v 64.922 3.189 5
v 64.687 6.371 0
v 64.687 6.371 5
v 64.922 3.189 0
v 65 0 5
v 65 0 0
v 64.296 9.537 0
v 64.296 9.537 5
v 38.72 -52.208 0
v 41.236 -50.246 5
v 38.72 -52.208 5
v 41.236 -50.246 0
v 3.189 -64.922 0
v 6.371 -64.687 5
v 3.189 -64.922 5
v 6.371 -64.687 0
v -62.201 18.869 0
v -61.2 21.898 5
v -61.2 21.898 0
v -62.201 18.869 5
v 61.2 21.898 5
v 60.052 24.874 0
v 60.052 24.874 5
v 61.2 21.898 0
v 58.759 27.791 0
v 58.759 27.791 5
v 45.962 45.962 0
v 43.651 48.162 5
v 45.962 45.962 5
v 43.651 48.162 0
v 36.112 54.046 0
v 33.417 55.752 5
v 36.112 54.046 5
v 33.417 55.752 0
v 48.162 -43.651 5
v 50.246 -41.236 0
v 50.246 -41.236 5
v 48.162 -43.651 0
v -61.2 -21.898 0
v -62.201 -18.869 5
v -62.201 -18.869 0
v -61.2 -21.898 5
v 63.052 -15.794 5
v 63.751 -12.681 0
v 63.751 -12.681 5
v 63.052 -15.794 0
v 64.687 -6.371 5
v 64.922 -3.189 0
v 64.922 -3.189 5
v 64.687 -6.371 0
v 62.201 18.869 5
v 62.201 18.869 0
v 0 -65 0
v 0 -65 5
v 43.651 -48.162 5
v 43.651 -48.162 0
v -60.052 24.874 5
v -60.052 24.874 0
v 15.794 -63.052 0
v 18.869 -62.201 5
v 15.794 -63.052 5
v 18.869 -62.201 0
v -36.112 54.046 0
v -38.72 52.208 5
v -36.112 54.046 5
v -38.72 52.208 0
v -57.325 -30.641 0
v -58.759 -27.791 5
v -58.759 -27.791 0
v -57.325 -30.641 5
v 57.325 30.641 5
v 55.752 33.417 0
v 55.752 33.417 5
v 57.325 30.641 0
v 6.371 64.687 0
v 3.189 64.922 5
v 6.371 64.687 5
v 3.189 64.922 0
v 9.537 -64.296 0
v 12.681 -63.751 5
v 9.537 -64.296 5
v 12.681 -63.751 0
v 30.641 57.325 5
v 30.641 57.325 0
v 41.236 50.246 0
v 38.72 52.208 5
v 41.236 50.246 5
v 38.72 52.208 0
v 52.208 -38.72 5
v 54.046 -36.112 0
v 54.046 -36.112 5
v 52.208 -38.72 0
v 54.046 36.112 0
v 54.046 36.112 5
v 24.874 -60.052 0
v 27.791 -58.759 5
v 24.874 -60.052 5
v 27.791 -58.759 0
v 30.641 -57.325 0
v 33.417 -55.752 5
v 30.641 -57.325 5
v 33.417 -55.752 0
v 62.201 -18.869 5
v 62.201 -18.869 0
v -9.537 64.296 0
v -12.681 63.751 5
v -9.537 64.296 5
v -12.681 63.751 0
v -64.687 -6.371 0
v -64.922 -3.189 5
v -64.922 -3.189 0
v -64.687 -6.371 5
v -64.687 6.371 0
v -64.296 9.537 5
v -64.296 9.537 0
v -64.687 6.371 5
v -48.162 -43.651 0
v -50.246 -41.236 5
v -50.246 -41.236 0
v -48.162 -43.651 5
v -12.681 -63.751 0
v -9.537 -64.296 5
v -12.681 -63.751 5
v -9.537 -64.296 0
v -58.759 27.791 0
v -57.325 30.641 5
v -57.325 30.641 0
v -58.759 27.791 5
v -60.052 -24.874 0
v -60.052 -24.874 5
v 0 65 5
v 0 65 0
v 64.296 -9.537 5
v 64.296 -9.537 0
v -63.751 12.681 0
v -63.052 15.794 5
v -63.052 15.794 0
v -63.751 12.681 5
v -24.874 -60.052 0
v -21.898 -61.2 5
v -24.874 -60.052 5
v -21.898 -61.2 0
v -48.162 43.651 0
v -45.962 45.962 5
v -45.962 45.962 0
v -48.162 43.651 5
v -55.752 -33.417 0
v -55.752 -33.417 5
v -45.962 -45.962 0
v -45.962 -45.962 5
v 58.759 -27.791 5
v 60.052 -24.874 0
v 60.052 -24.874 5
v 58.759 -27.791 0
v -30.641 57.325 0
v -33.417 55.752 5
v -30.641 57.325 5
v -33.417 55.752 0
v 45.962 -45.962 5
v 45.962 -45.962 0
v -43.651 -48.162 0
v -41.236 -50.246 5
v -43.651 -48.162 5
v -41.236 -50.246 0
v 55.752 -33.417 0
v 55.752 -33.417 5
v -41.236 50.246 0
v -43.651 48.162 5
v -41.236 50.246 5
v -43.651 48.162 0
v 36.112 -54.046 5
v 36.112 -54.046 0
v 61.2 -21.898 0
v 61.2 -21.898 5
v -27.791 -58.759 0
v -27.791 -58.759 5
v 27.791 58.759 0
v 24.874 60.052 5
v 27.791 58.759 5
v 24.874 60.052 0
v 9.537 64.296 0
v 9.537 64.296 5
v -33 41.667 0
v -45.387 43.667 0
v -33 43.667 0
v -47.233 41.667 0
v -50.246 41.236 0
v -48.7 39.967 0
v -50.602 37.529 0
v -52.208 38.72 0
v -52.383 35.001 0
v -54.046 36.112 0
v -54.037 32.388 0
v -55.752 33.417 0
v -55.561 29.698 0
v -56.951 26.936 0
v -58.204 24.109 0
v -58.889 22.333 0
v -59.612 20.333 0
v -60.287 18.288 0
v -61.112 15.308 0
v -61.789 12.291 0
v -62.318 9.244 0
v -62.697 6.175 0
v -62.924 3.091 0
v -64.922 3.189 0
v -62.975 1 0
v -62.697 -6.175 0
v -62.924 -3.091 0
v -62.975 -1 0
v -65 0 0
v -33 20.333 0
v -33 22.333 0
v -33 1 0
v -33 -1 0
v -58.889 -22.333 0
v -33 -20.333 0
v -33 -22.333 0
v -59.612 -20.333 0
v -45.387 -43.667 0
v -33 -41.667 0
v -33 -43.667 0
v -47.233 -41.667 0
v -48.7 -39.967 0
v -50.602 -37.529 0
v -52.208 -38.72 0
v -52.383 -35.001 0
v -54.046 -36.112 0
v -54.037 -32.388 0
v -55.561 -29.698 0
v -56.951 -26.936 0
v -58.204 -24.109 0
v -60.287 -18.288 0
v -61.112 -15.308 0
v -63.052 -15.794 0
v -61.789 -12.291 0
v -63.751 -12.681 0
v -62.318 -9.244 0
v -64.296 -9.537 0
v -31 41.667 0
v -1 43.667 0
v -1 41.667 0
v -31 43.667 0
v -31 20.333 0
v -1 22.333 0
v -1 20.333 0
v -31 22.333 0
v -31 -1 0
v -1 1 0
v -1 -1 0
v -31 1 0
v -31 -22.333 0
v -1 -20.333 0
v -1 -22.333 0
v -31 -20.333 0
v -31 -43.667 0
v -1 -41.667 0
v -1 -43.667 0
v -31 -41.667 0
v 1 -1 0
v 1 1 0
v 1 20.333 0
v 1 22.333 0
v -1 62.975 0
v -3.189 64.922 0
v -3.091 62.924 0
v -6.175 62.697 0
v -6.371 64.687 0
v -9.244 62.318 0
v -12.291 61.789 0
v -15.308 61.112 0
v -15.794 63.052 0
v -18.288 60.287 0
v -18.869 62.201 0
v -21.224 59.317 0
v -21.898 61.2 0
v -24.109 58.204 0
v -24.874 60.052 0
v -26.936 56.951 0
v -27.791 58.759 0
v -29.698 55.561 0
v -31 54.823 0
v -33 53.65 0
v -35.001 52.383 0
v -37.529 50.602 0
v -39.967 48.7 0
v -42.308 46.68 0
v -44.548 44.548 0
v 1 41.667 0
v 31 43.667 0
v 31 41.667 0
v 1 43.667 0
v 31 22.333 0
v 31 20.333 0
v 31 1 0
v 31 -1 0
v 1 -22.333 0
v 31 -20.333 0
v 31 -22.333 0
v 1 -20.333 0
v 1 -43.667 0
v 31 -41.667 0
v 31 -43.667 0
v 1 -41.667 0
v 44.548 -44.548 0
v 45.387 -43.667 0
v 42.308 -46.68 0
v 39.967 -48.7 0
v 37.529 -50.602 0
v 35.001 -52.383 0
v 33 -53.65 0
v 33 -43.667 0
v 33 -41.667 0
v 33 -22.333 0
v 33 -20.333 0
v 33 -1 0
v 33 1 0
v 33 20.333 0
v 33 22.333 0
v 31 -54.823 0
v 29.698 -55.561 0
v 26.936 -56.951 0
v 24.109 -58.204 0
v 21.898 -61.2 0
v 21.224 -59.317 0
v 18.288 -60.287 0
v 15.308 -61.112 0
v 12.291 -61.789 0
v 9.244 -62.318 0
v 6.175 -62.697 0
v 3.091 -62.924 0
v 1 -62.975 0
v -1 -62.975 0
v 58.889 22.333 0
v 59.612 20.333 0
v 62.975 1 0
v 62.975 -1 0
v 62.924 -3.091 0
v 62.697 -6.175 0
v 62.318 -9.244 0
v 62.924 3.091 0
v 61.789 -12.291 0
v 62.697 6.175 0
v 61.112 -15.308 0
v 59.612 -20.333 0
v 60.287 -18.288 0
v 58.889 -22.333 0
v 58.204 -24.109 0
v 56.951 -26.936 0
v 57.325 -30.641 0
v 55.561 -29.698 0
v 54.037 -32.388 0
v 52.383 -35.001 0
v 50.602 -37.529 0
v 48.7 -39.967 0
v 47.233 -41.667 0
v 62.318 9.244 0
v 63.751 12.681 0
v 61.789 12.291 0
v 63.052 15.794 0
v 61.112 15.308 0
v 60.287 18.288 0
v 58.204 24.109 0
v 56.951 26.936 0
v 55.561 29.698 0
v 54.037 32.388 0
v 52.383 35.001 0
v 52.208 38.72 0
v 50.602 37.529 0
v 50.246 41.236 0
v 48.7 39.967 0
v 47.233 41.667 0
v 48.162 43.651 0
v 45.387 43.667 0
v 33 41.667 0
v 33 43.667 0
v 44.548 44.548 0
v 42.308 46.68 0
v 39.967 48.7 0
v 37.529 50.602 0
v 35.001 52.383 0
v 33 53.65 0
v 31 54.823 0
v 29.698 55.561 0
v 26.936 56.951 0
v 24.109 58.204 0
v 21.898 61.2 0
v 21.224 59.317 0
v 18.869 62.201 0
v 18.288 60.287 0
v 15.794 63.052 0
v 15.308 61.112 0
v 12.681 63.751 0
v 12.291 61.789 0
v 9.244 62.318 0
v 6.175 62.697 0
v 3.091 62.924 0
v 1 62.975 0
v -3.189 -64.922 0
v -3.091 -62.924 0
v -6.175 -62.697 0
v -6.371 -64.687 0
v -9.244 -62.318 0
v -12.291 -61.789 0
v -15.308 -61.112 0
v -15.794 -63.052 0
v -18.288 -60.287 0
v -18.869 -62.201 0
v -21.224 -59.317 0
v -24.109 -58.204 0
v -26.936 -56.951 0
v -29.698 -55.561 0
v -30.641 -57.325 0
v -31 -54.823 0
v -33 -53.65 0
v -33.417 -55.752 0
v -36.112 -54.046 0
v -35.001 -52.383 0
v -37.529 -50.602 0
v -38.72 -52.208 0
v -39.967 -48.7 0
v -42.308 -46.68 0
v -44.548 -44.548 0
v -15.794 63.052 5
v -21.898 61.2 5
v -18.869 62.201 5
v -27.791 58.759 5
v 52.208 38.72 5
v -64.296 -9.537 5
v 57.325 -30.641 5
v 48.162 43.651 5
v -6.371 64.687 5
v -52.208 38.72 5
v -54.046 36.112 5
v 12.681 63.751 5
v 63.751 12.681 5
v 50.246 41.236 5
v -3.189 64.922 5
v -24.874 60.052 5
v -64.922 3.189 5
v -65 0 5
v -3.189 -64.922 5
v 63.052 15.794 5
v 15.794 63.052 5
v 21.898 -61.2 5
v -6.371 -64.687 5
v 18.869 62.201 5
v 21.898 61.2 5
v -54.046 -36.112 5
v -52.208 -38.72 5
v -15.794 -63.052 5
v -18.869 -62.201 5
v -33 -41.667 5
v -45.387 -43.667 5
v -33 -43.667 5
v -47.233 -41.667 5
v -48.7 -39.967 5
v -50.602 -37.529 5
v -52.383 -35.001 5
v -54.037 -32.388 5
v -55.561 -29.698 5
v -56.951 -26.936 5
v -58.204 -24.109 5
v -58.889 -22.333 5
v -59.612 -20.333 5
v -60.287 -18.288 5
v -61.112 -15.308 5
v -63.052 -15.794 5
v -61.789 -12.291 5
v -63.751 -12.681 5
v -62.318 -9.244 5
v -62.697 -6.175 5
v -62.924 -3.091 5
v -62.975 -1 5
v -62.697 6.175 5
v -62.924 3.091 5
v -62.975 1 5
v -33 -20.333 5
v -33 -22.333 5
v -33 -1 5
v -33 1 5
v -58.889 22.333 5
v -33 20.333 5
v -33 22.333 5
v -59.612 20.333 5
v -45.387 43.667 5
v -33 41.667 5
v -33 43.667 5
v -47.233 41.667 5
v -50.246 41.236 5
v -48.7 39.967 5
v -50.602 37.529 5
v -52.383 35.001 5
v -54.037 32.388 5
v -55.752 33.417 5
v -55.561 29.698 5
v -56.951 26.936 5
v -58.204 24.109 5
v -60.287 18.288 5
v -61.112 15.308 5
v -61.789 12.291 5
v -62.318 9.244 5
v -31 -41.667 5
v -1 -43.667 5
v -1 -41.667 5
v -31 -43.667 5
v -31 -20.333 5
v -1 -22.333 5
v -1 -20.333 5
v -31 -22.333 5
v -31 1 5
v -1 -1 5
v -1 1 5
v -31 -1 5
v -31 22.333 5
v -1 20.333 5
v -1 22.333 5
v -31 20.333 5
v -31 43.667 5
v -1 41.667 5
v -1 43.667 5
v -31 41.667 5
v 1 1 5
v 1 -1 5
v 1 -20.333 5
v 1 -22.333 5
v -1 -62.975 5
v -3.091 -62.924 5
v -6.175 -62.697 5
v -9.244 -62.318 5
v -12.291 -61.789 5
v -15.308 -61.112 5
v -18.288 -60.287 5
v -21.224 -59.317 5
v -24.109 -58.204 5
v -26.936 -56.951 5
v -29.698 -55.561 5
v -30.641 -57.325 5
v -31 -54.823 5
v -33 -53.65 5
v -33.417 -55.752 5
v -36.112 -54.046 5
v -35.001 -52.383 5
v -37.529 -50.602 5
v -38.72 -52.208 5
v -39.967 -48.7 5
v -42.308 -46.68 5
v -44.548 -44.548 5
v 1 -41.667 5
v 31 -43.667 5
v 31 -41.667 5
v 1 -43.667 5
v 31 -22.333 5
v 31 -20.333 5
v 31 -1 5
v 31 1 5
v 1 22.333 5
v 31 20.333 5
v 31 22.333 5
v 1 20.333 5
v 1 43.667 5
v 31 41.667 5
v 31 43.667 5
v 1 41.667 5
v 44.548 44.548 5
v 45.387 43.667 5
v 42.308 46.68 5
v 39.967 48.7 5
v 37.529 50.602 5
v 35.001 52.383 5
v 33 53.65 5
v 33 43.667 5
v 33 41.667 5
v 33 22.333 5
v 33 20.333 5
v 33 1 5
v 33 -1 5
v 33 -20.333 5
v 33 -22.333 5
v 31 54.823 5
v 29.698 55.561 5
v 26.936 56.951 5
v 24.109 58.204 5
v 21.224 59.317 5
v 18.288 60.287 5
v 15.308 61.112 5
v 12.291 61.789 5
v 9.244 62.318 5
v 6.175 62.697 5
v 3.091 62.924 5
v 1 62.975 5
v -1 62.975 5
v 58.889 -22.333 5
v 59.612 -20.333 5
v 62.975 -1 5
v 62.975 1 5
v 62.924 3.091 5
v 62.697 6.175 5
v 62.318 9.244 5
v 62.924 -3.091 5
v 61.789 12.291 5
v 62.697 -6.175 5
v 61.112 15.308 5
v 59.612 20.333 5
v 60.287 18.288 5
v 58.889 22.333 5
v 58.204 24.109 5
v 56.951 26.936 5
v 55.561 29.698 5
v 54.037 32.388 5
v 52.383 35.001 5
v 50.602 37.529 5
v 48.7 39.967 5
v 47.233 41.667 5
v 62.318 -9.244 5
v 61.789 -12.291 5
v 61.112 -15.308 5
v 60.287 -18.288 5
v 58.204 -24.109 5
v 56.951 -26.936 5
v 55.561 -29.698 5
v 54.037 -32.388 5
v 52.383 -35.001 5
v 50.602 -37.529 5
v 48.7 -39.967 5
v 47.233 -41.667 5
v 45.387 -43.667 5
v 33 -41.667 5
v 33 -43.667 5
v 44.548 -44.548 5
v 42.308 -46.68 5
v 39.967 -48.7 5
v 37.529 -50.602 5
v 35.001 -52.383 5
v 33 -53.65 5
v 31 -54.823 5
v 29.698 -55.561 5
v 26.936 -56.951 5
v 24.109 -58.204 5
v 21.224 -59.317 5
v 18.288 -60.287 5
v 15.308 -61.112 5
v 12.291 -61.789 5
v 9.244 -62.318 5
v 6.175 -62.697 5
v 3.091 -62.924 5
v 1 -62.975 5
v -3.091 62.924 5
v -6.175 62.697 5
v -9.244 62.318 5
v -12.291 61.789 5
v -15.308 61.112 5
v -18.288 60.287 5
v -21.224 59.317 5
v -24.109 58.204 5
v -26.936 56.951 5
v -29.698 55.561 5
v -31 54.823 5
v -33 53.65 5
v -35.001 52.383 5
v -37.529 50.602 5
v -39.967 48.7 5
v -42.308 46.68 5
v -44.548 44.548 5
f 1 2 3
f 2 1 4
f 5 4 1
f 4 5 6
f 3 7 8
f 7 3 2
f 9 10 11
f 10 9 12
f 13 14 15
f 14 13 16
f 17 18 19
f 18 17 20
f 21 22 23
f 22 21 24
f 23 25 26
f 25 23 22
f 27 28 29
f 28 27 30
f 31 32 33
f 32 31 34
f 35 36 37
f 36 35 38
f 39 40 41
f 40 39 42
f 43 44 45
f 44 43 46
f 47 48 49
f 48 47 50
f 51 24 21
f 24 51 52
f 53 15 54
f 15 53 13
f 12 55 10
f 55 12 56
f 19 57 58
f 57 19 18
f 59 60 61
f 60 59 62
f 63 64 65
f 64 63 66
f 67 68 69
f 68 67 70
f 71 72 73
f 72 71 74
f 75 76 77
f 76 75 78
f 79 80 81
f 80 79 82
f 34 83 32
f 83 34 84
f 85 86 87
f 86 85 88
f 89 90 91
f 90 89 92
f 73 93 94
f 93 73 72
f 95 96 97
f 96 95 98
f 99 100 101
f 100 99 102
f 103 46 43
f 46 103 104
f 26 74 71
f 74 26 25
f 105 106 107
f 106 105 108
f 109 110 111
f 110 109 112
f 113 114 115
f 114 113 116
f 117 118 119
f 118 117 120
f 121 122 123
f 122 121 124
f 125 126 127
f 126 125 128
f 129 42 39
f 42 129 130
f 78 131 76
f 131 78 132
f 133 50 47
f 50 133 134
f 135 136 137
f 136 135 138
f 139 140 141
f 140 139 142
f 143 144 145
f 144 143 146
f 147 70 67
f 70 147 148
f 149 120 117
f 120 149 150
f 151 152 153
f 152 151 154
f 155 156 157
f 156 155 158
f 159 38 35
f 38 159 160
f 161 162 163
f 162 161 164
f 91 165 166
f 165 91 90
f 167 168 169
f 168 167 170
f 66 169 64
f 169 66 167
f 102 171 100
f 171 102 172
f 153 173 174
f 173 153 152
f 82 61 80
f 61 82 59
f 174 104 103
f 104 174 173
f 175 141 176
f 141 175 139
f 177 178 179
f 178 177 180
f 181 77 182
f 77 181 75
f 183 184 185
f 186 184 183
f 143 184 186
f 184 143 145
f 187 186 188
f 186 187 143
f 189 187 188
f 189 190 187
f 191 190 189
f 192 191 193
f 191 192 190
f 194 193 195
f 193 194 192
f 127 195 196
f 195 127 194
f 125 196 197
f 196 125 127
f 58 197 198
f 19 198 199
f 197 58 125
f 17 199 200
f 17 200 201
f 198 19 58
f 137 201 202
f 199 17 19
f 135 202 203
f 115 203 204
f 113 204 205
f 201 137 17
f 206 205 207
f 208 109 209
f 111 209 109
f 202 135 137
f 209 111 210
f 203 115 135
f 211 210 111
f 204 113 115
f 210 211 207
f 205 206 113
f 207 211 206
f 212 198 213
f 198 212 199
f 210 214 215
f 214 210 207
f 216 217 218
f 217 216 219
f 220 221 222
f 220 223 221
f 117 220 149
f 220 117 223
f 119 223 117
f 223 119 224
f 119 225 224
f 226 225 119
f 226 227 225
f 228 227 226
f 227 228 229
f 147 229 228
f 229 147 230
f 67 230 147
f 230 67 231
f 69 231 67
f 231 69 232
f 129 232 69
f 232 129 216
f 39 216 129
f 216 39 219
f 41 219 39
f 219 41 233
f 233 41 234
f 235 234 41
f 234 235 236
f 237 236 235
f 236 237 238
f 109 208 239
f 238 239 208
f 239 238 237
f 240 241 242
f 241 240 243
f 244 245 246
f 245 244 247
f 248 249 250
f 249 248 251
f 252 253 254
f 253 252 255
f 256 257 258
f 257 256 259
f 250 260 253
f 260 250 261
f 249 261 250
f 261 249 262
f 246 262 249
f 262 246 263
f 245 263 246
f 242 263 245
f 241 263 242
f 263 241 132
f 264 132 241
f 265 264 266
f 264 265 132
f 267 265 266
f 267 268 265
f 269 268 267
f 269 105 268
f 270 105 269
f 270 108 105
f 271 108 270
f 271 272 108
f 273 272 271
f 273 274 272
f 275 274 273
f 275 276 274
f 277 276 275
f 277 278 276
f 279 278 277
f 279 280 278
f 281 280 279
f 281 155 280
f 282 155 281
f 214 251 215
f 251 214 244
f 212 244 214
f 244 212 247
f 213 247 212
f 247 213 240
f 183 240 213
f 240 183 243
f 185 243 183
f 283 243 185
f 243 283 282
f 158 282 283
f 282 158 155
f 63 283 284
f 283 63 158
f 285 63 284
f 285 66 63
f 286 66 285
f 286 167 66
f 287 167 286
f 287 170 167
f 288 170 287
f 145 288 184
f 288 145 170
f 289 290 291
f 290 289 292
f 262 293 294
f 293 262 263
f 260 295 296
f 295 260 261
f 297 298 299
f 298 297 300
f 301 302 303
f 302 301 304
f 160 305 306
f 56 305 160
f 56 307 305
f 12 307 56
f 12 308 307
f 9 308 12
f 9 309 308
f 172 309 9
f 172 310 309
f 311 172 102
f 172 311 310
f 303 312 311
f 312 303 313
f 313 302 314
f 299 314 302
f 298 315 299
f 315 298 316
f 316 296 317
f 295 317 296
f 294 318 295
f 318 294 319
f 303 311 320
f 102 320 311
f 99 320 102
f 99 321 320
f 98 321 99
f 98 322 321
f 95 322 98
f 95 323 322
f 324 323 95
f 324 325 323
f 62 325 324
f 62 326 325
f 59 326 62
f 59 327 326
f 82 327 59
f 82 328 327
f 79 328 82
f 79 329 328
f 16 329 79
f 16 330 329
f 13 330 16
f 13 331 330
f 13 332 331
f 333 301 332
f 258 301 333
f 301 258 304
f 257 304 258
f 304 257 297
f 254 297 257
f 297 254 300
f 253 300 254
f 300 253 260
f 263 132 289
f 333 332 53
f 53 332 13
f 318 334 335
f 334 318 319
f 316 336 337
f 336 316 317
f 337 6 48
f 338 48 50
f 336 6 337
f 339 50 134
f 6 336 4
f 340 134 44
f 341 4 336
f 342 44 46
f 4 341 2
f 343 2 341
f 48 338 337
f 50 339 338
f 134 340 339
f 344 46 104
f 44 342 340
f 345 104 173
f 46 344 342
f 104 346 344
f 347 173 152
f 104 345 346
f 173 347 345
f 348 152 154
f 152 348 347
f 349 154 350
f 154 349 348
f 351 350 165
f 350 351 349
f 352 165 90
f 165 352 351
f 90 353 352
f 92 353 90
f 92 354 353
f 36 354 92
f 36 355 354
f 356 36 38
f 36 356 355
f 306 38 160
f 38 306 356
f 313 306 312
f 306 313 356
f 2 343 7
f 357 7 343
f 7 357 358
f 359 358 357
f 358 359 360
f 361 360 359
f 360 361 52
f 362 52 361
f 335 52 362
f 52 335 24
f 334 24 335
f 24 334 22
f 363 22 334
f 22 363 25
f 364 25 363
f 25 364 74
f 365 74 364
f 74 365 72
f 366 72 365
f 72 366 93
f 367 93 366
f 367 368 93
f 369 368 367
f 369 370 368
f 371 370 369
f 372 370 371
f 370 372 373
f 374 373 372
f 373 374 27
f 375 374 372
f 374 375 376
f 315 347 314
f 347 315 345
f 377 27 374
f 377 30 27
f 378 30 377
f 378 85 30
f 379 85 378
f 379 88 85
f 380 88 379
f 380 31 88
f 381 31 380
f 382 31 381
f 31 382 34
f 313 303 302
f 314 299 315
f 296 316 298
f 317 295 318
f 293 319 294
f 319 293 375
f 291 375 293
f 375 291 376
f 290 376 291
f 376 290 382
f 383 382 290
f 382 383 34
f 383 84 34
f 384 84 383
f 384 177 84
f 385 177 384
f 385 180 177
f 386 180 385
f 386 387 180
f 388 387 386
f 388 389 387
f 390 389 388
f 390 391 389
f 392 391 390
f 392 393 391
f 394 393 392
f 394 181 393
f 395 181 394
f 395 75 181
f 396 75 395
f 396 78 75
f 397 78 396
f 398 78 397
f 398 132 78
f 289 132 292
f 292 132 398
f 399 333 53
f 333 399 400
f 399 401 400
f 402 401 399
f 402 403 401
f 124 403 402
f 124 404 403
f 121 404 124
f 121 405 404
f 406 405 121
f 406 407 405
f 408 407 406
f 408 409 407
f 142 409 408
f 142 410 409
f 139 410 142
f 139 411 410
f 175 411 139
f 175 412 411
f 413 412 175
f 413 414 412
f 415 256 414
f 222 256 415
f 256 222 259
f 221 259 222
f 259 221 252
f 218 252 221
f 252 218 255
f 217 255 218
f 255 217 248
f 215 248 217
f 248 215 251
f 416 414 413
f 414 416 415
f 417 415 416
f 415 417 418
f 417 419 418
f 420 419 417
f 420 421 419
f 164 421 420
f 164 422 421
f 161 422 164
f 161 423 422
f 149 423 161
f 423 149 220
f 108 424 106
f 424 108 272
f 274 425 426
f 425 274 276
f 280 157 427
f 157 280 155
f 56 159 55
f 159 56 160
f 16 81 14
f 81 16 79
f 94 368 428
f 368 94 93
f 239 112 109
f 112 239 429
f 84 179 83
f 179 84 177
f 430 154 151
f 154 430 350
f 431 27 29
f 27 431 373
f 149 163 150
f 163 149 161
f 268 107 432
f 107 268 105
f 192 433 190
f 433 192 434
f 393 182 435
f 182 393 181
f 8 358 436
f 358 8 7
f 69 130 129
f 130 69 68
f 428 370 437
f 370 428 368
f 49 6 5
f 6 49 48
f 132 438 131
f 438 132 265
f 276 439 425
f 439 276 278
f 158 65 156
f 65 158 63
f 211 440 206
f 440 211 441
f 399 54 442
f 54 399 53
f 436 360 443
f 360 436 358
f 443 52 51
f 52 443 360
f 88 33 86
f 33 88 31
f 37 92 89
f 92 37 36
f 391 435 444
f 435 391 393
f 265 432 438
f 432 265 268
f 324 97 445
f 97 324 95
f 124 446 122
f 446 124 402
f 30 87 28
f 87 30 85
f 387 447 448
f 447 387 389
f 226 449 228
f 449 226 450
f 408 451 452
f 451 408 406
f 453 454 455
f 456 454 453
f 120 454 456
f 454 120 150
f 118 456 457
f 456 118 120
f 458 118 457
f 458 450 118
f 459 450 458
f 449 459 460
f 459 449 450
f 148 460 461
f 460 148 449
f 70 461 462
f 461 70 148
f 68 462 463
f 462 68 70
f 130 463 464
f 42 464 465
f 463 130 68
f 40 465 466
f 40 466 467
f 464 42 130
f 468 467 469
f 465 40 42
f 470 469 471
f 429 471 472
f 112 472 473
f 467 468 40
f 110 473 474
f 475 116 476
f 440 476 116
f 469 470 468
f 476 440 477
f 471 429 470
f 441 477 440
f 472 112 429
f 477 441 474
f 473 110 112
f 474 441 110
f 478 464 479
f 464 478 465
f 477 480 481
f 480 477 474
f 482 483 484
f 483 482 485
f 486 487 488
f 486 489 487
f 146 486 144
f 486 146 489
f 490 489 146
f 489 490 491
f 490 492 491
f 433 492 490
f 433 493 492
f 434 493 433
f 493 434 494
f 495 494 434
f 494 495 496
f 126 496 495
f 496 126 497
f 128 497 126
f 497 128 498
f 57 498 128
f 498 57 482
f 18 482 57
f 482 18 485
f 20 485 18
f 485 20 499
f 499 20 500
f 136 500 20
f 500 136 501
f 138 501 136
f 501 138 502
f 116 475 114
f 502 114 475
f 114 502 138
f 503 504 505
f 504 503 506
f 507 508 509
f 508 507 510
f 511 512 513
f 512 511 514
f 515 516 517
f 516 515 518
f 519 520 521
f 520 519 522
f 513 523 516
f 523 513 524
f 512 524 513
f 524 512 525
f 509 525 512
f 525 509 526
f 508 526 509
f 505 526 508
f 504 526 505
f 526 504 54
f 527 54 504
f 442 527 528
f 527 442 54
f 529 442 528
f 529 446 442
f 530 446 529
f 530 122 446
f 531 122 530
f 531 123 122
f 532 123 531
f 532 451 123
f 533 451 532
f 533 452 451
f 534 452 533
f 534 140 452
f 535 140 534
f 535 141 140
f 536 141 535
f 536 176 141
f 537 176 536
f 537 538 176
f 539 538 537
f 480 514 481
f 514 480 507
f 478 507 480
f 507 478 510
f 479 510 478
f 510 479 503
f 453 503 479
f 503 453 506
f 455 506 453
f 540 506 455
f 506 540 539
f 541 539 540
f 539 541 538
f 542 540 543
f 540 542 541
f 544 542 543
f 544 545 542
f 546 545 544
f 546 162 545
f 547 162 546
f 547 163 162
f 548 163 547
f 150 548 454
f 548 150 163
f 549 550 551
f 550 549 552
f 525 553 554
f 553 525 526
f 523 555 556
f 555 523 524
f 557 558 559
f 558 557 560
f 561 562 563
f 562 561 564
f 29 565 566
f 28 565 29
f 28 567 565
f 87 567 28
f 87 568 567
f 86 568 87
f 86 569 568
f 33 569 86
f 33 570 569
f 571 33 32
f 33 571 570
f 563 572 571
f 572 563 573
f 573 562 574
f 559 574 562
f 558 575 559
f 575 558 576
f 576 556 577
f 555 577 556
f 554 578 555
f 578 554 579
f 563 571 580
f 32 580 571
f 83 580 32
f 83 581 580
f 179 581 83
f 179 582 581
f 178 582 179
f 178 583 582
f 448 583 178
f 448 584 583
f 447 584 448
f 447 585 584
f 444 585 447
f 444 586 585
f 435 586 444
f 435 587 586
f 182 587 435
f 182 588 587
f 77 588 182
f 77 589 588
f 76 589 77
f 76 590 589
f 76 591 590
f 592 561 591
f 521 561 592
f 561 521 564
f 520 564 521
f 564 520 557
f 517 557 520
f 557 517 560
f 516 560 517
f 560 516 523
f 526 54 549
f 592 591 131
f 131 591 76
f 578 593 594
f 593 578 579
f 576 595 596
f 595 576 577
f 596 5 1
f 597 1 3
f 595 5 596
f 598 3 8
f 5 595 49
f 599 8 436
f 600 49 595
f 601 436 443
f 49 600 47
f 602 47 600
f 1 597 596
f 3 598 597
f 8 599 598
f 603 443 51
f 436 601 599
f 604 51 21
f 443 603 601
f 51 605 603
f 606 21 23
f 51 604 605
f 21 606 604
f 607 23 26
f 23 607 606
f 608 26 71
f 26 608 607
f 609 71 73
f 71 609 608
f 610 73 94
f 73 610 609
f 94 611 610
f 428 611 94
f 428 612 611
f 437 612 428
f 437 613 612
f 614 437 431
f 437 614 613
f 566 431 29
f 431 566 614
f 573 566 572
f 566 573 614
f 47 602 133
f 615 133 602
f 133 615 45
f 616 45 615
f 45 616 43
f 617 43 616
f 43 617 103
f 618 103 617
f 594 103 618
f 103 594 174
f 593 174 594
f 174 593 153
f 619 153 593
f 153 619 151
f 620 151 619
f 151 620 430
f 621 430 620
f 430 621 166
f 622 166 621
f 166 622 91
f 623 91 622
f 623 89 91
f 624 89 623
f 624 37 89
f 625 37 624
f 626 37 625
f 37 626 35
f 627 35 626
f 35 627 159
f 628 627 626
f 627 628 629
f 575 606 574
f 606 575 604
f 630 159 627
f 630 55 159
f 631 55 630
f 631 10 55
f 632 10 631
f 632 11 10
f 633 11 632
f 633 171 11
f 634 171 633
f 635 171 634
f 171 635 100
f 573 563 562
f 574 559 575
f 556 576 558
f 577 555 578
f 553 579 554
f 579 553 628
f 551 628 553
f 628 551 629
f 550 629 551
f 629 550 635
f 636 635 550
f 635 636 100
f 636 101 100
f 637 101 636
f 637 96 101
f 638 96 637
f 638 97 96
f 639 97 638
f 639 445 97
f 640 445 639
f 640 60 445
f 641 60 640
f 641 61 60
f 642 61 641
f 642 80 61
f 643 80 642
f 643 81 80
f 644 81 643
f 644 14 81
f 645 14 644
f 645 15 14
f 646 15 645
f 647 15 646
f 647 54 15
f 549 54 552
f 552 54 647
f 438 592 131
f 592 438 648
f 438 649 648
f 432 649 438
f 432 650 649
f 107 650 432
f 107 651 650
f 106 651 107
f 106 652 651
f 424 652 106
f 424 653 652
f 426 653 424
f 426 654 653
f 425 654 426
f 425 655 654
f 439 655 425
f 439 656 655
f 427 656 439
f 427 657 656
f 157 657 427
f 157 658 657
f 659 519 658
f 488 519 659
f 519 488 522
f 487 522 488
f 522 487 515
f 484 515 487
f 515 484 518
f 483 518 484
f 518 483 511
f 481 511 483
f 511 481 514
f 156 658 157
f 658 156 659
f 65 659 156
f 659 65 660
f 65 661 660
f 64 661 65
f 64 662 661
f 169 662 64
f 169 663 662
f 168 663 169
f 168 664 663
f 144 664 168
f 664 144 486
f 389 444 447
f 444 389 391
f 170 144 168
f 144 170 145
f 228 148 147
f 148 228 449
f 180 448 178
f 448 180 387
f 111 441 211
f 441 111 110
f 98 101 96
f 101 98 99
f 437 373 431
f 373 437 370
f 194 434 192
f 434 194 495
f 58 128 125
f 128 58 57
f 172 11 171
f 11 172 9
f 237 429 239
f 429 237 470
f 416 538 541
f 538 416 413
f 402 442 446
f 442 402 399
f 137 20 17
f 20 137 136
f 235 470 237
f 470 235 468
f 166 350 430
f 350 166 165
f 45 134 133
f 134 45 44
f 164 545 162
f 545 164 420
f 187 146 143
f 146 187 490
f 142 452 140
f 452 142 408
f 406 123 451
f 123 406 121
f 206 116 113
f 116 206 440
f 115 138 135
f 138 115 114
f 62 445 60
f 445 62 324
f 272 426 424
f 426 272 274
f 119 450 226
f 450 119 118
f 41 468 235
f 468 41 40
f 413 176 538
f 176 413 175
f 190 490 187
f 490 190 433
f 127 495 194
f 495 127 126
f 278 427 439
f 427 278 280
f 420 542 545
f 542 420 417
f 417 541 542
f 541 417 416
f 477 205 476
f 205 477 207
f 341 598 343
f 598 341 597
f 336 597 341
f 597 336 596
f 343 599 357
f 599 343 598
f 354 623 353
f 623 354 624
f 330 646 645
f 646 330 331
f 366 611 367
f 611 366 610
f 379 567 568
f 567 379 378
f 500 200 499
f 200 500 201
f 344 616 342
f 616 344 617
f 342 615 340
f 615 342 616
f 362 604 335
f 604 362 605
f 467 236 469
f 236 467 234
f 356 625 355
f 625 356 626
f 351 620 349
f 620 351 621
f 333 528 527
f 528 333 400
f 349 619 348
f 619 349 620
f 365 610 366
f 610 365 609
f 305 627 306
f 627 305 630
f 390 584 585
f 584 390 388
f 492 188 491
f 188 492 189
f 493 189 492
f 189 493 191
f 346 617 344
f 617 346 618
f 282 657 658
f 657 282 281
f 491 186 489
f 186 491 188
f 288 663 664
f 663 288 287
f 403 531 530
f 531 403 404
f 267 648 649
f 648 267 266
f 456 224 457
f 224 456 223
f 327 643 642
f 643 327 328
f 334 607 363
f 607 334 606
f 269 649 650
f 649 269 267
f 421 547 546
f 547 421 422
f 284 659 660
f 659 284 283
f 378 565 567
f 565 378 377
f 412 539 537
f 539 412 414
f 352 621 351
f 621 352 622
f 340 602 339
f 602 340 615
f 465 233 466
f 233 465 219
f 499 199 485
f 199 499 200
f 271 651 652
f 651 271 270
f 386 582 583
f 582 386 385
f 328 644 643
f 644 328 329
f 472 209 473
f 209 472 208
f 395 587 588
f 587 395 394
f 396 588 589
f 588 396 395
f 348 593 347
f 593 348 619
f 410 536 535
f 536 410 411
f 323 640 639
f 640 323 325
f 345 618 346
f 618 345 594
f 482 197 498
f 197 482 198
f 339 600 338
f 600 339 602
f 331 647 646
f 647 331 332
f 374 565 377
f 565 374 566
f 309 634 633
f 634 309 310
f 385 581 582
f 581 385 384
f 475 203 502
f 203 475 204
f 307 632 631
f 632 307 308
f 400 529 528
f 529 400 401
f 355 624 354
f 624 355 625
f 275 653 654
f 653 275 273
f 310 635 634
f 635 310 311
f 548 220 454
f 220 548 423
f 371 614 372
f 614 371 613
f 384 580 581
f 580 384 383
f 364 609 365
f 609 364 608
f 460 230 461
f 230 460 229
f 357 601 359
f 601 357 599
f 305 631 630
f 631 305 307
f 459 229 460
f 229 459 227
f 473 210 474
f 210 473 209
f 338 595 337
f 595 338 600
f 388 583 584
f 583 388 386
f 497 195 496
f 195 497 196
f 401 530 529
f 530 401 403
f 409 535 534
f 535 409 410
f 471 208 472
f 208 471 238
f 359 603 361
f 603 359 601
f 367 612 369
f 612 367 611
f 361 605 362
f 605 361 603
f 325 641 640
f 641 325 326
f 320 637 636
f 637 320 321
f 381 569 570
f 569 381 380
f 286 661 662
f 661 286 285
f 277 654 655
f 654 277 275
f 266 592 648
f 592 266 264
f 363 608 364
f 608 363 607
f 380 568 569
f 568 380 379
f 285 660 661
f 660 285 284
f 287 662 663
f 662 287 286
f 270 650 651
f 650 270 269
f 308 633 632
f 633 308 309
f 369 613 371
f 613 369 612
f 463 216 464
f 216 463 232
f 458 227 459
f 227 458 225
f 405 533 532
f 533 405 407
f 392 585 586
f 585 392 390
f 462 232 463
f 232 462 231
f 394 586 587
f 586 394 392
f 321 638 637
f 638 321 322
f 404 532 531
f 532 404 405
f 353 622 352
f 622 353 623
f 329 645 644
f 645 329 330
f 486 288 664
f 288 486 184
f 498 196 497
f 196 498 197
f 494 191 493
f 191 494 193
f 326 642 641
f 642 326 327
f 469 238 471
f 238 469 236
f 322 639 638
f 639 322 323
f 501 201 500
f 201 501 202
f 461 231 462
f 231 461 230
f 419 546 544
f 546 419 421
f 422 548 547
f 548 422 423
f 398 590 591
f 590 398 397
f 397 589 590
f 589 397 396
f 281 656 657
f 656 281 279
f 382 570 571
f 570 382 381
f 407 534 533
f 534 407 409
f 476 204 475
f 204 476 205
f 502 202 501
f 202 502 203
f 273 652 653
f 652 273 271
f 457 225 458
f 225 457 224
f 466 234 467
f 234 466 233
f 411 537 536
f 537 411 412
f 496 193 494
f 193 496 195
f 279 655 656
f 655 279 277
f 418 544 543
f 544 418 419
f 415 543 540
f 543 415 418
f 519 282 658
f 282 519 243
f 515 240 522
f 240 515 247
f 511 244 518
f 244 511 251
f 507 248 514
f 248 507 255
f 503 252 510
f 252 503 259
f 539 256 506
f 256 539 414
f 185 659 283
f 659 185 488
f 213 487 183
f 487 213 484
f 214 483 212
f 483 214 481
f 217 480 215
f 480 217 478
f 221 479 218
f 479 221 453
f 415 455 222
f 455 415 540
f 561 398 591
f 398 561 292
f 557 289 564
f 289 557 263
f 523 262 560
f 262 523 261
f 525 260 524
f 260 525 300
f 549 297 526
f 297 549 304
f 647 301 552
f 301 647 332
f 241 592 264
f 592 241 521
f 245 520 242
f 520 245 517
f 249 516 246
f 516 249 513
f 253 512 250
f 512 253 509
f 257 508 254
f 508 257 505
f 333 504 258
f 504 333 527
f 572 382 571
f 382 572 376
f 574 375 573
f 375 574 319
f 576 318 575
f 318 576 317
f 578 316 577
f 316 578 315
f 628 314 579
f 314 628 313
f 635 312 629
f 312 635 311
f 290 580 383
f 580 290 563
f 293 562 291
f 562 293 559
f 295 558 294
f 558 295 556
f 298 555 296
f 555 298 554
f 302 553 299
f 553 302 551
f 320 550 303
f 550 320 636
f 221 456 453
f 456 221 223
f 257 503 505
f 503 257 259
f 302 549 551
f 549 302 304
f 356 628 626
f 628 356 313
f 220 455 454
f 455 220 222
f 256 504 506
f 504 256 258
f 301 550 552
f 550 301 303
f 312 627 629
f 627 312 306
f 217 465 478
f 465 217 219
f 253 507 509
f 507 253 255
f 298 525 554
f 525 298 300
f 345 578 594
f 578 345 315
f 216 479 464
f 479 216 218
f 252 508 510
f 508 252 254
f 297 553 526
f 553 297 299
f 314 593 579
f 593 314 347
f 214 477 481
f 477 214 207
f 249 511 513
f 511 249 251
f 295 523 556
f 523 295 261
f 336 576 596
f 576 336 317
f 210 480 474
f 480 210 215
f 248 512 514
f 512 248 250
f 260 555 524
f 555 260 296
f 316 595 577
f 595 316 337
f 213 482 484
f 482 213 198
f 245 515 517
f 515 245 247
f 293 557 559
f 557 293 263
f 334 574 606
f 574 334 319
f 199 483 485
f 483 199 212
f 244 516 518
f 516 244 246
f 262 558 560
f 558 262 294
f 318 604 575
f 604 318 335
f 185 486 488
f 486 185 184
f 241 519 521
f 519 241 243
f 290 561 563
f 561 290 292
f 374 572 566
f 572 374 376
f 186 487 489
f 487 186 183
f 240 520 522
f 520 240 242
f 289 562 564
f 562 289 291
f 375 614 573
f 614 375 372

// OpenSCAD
//
// A grid insert for a plastic bowl
//

$fn=128;

$w   = 130;  // width
$t_w =   2;  // thickness in width direction
$t_h =   5;  // thickness in height direction

$w_n = 4;    // number of segments in width direction
$d_n = 6;    // number of segments in depth direction

$d   = $w;   // depth
$t_d = $t_w; // thickness in depth direction

union() {
    // outside ring
	difference() {
		cylinder( h=$t_h, d1=$w,        d2=$d );
		translate( [ 0, 0, -1 ] ) {
			cylinder( h=$t_h+2, d1=$w-2*$t_w, d2=$d-2*$t_d );
		}
	}
	
	// inside griddle limited by ring
	intersection() {
		translate( [ 0, 0, -1 ] ) {
			cylinder( h=$t_h+2, d1=$w-$t_w, d2=$d-$t_d );
		}
	
		// griddle
		union() {
			for( i = [1 : $w_n-1 ] ) {
				translate( [ -$w/2 + i*(( $w - $t_w )/$w_n ), -$d/2, 0 ] ) {
					cube( [ $t_w, $d, $t_h ] );
				}
			}
			for( i = [1 : $d_n-1 ] ) {
				translate( [ -$w/2, -$d/2 + i*(( $d - $t_d )/$d_n ), 0 ] ) {
					cube( [ $w, $t_d, $t_h ] );
				}
			}
		}
	}
}
